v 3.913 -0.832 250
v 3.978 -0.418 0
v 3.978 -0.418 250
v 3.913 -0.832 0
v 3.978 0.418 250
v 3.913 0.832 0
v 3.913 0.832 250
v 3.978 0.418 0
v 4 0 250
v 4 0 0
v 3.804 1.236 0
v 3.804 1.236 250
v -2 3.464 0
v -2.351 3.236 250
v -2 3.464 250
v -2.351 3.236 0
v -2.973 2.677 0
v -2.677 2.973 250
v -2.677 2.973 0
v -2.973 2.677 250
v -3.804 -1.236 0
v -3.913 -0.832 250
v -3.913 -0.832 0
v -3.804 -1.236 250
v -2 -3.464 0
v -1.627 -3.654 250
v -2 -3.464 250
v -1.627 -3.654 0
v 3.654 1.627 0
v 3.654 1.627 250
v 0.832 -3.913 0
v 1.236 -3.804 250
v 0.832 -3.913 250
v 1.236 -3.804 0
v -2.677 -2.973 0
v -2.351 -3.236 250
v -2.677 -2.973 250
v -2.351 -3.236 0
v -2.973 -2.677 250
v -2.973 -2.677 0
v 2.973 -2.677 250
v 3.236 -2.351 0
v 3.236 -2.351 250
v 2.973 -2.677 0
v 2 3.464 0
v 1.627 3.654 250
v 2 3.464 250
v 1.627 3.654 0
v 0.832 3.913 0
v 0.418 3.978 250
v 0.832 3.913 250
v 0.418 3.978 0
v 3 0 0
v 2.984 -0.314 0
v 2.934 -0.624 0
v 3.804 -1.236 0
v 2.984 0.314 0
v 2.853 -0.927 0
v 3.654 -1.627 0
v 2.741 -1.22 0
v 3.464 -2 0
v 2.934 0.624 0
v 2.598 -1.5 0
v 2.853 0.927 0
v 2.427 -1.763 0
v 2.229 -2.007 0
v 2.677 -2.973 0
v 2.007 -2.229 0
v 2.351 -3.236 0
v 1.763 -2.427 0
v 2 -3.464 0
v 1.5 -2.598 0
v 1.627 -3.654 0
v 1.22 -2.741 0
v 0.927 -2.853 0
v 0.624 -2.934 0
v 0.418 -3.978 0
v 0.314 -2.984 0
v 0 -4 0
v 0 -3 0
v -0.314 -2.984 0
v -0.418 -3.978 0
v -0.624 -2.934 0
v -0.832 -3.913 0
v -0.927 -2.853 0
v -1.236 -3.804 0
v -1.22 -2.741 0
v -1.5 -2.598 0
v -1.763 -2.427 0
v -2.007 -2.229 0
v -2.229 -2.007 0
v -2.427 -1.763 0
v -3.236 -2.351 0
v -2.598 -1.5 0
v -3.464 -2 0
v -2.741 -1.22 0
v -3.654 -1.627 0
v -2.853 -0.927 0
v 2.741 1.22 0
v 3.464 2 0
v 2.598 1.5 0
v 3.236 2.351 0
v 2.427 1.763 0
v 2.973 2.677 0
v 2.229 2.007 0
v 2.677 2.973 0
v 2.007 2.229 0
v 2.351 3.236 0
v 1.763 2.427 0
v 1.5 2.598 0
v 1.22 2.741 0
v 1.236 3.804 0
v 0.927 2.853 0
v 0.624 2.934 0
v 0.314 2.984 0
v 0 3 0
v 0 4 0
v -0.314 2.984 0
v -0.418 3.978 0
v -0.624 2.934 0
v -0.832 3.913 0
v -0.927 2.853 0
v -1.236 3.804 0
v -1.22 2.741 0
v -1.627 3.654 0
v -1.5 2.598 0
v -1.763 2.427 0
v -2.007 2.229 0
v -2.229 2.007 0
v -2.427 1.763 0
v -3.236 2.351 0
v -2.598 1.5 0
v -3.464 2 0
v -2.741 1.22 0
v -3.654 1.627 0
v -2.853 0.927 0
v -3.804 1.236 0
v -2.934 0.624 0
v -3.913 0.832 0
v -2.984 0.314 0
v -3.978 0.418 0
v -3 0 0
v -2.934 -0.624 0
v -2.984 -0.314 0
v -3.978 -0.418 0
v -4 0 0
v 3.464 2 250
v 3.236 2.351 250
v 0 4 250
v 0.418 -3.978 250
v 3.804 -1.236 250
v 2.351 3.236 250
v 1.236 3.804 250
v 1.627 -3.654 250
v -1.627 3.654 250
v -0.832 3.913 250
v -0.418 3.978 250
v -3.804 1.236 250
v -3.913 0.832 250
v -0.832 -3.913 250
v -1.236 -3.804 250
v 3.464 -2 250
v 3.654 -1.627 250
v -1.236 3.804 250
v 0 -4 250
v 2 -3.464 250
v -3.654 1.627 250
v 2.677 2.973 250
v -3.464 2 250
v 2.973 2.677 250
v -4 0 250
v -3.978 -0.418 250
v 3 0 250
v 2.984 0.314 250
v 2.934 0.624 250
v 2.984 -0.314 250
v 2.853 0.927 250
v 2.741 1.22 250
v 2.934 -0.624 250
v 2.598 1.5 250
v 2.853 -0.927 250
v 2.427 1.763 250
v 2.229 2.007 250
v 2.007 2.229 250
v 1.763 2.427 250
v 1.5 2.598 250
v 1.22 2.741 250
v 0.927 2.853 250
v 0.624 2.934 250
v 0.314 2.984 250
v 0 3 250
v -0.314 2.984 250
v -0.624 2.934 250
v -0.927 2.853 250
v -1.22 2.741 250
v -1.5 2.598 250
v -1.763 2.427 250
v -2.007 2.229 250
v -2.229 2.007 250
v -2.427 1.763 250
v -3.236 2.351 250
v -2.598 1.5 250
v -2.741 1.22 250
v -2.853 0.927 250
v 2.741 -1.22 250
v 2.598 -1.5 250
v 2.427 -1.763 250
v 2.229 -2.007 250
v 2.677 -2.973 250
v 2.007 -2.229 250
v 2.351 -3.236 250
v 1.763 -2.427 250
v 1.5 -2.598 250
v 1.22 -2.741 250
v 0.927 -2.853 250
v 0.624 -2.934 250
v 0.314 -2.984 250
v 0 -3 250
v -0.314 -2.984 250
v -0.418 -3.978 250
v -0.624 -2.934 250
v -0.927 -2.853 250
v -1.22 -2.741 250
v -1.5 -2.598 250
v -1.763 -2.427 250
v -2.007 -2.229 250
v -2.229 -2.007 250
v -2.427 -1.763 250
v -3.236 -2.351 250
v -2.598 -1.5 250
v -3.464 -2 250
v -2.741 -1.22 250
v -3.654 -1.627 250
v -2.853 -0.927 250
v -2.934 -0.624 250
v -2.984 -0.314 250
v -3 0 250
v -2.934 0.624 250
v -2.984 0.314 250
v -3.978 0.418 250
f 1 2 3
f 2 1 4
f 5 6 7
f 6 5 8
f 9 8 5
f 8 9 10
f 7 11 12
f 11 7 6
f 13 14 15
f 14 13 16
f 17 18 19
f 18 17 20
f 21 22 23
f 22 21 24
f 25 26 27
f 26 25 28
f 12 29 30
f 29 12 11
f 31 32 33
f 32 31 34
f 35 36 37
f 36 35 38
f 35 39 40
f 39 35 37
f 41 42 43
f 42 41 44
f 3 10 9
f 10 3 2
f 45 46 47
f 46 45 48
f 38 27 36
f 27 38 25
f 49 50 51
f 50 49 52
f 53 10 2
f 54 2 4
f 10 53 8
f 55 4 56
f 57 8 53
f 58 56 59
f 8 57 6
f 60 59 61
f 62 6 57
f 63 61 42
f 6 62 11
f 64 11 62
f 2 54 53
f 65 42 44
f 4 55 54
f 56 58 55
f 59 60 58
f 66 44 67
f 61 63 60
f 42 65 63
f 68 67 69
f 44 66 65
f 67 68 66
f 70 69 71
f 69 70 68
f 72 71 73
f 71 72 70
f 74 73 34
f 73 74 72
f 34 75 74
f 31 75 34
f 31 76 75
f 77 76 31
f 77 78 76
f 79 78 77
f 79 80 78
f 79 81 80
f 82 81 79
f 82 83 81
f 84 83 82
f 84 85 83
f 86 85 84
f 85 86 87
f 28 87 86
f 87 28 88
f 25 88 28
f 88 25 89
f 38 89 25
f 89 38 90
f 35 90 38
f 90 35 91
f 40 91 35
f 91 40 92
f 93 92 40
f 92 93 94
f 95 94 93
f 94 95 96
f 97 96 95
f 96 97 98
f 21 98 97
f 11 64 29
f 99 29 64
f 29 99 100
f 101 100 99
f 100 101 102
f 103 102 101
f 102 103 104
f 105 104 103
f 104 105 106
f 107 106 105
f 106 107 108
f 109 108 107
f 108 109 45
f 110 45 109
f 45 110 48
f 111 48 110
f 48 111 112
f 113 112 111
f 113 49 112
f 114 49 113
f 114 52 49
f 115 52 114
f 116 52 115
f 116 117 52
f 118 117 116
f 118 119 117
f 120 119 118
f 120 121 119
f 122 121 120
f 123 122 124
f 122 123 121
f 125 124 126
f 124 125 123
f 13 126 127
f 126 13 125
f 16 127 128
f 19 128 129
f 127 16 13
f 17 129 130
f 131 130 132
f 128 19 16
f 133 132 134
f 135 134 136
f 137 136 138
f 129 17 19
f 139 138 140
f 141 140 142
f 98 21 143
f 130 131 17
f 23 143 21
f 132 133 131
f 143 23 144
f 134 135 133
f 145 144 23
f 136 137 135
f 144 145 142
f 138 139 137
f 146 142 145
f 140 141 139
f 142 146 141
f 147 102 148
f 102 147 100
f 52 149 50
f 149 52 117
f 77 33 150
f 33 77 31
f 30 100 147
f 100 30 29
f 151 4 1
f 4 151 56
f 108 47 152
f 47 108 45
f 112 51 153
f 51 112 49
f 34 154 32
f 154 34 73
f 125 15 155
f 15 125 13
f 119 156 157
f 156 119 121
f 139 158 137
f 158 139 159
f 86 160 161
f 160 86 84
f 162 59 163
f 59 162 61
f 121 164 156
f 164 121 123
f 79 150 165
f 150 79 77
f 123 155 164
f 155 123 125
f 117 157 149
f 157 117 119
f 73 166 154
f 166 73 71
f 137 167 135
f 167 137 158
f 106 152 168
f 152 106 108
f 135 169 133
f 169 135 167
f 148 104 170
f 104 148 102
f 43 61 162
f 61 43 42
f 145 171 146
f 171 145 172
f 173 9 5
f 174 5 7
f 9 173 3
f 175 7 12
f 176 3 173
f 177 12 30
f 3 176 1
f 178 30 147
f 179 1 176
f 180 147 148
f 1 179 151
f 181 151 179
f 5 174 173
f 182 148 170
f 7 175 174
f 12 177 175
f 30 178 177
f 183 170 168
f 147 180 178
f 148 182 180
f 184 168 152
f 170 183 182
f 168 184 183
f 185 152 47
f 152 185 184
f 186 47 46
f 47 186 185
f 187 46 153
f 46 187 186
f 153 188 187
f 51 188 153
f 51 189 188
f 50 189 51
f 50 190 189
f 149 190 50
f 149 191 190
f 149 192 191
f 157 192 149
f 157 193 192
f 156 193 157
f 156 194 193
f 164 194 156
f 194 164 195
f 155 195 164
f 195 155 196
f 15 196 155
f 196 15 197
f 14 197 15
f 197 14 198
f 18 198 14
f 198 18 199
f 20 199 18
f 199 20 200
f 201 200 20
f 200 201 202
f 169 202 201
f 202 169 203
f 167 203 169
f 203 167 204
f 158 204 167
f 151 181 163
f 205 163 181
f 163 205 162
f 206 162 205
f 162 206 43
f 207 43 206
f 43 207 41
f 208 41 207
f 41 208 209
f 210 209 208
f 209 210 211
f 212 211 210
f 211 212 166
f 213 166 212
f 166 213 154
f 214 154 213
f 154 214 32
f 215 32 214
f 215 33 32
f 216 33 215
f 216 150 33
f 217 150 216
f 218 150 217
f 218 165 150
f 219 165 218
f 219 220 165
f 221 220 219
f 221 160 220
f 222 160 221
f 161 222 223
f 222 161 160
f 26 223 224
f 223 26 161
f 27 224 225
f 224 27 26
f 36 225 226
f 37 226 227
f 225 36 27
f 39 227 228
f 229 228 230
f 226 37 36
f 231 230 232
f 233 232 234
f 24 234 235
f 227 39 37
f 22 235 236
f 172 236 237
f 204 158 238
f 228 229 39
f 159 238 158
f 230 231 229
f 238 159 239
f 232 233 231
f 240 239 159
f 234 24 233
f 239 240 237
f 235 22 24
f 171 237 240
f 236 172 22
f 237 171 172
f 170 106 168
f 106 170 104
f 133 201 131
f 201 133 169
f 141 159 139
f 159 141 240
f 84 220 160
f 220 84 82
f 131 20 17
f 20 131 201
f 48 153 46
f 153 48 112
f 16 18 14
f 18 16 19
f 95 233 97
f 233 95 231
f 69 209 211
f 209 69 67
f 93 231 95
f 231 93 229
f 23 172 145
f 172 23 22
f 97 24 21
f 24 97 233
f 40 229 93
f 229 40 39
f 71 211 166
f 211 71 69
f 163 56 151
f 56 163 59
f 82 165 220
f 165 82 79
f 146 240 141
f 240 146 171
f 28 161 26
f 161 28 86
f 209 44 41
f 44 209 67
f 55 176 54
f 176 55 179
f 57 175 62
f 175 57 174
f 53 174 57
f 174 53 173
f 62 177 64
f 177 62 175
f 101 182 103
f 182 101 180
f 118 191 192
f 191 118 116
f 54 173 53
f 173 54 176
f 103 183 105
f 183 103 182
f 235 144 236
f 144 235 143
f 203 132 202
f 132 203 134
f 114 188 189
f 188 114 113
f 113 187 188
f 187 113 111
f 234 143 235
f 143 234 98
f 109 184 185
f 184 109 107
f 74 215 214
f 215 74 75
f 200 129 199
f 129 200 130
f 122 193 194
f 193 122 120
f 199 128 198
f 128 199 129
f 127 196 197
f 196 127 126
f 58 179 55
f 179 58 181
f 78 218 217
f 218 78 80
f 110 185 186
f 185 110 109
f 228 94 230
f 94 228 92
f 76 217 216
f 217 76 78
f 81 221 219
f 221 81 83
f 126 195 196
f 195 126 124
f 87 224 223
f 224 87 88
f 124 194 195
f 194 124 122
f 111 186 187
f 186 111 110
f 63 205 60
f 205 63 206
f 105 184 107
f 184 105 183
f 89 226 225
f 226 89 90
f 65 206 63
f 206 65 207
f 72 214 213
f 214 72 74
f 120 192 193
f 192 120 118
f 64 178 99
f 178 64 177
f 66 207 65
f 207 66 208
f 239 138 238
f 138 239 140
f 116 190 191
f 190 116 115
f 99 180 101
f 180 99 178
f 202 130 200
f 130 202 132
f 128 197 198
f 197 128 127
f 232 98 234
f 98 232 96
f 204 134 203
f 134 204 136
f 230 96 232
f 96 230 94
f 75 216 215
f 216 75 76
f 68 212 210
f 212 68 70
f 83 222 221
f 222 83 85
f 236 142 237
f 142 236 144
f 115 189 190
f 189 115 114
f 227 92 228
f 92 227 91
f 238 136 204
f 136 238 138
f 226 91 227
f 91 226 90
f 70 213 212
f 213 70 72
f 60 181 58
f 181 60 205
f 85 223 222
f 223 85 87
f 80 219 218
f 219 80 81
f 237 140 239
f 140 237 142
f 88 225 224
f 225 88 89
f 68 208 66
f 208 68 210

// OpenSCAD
// file: _params.scad
// =========================================================================
// 공유 파라미터 (모든 개별 부품 파일에서 include)
// 메인 어셈블리: cup_z_x_catrage_frame_water_mic_anti_3030.scad 에서 추출
// 프레임: 600 × 420 × 700mm (3030 프로파일, Y=0 대칭)
// =========================================================================

$fn = 60;  // 부품 출력용 고해상도
GLOBAL_TOLERANCE = 0.2;

// --- [1] 하부 기성품 및 원통 파라미터 ---
X_RAIL_LEN = 290.0;
X_BLOCK_W = 30.0; X_BLOCK_L = 32.0;   // 신규 X슬라이더 블록 (폭 30mm × 길이 32mm)
X_PITCH_X = 20.0; X_PITCH_Y = 20.0;   // 체결 홀 피치 (20 × 20mm, M3 나사탭 4개)
X_RAIL_W = 30.0;  X_RAIL_H = 20.0;   // 레일 폭 30mm (레일 바닥~블록 윗면 높이 29mm 반영)
X_TOTAL_H = 29.0;                    // 레일 바닥에서 슬라이더 블록 윗면까지의 높이

MOTOR_W = 42.0;      MOTOR_PITCH = 31.0; MOTOR_HOLE_D = 3.5;    
MOTOR_BOSS_D = 22.0; MOTOR_BOSS_H = 2.0; SCREW_D = 8.0;         
MOT_BODY_L = 41.0;   SHAFT_L = 24.0;     // 실측 NEMA17 몸통 41mm / 축 돌출 24mm

CUP_ID = 99.5;  CUP_WALL = 5.0; CUP_OD = 110.0;     // 아크릴 원통 OD110/ID100
CUP_H = 180.0;   CAGE_H = 60.0;  FLOOR_H = 10.0; PISTON_H = 20.0;     

LIP_D = 30.0;    LIP_H = 5.0;    LEAK_DRAIN_D = 4.0;    
GUIDE_PIPE_D = 8.0; BUSHING_OD = 12.0; BUSHING_H = 8.0;       
DRAIN_RADIUS = 35.0; DRAIN_D = 8.0;        

Y_OFFSET = 85.0; BRKT_H = 12.0; BRKT_D = 122.0; BRKT_ID = 62.0; Z_MOUNT_PCD = 86.0;   

// --- [2] 아크릴 파이프 및 상부 카트리지 ---
ACRYL_ID = 100.0; ACRYL_T = 5.0; ACRYL_OD = ACRYL_ID + (ACRYL_T * 2);  // OD110 (아크릴집 106 재고없음 → 컵과 동일 규격)

REVOLVER_PCD = 240.0;     // 인접 카트리지 웹 9.8mm 확보 (OD110 대응, 230→240)
CARTRIDGE_OD = REVOLVER_PCD + ACRYL_OD + 8; 
TOP_PLATE_H = 15.0;       // 아크릴 15T 통판 (보스홀 단 깊이 10mm)

HUB_D = 60.0;            
SHAFT_D = 12.0;          
HUB_WALL = 4.0;          
HUB_H = 15.0;             // 아크릴 5T × 3장 적층 — 파이프 130mm 대응
POCKET_DEPTH = 5.0;
MID_HUB_Z = 63.5;          // 중단 허브 하면 Z (벨트 중심 Z=71.0mm 정렬, 풀리 상단 Z=75.0mm = 축상단-1mm)
UPPER_HUB_Z = 135.0;       // 상단 허브 하면 Z (전체 135+15=150 유지)
BOSS_OD = 35.0;
BOSS_H = 11.0;             // 보스11 + 와셔1 = 12, 리세스10 → 허브 2mm 공중

// --- [3] GT2 벨트 구동 시스템 ---
GT2_PITCH     = 2.0;
GT2_BELT_W    = 6.0;
BIG_PULLEY_TEETH = 566;
BIG_PULLEY_PD = BIG_PULLEY_TEETH * GT2_PITCH / PI;
BIG_PULLEY_OD = BIG_PULLEY_PD + 1.0;
SMALL_PULLEY_TEETH = 20;
SMALL_PULLEY_PD = SMALL_PULLEY_TEETH * GT2_PITCH / PI;
SMALL_PULLEY_OD = SMALL_PULLEY_PD + 1.0;

BELT_MOTOR_X = -300;
BELT_MOTOR_Y = -155.5;
BRKT_MOTOR_H = 25.0;
BRKT_MOTOR_W = 45.0;        // 브래킷 폭 45mm (프로파일 간섭 회피 복원)
SLOT_LEN = 10.0;
FLAG_W = 15.0;  FLAG_H = 8.0;  FLAG_T = 1.5;

X_POS_MEASURE = 170.0;   // 측정 브래킷 X좌표 (X_M~X_R 정중앙, X대칭)

// --- [4] 3030 프레임 경계 (600×430×700mm) ---
PF = 30;             // 3030 알루미늄 프로파일
WASHER_T = 1.0;     

X_L = -320;
X_M = 60;
X_R = 250;
Y_F = -210;          // 전방 (대칭: -210+30=-180, Y=0 중심)
Y_B = 180;           // 후방 (대칭: 180+30=210, Y=0 중심) — 메인파일과 동기화

Z_BOT = -480;
Z_RAIL = -322;
Z_MID = -TOP_PLATE_H - PF;
Z_TOP = 220;

SUPPORT_PILLAR_H = Z_TOP - PF;

SHAFT_SQ = 20;       // 2020 사각 회전축

// 사각 축 홀 크기
SQ = SHAFT_SQ + GLOBAL_TOLERANCE;  // 20.2mm

// --- 리볼버/컵 축 정렬 (보스홀=판 중심에 리볼버 정렬) ---
REVOLVER_CX = (X_L + X_M + PF)/2;        // 판 중심 = 보스홀 = 리볼버 회전축 (-115)
DROP_X      = REVOLVER_CX + REVOLVER_PCD/2;  // 링 드롭 / 컵 적재 축 (+5)

FLANGE_Z = 52.0;       // 모터 전면 안착 높이 (Z=52mm -> 축 상단 Z=76mm, 풀리 결합)

// --- [5] 모터 체결홀 (이미 제작 완료된 15T 상판 원본 도면 수치 100% 유지) ---
MOTOR_BOLT_PITCH     = 25.0;      // Y피치 (Y = ±12.5mm)
MOTOR_BOLT_X_NOMINAL = X_L + 55;  // 1열: 상판 좌단 55 (모터축 기준 +35mm = X=-265mm)
MOTOR_BOLT_X_SHIFT   = X_L + 40;  // 2열: 상판 좌단 40 (모터축 기준 +20mm = X=-280mm)

// 모터 마운트 볼트 카운터보어 (단볼트용 — 브래킷 두께 25 중 깊게 파냄)
MOTOR_CB_D     = 6.5;            // M3 캡볼트 머리 클리어런스
MOTOR_CB_DEPTH = 19;             // 카운터보어 깊이 (잔여 통과 6mm → M3×10 단볼트)
// main file
// =========================================================================
// [구매] 배수 및 가이드 알루미늄 파이프 × 1
// 구매: 알루미늄 원형 튜브 ø8 × 1.0T × 250mm (내경 ø6.0)
// 역할: 피스톤의 회전을 억제하는 가이드 및 피스톤 내부 물을 배출하는 통로
// =========================================================================
include <_params.scad>

color([0.55, 0.57, 0.6, 1.0]) {
    difference() {
        // 알루미늄 파이프 외경 (ø8)
        cylinder(d = GUIDE_PIPE_D, h = 250);
        // 내경 관통 (두께 1.0T 이므로 내경 ø6.0)
        translate([0, 0, -1])
            cylinder(d = GUIDE_PIPE_D - 2.0, h = 252);
    }
}
